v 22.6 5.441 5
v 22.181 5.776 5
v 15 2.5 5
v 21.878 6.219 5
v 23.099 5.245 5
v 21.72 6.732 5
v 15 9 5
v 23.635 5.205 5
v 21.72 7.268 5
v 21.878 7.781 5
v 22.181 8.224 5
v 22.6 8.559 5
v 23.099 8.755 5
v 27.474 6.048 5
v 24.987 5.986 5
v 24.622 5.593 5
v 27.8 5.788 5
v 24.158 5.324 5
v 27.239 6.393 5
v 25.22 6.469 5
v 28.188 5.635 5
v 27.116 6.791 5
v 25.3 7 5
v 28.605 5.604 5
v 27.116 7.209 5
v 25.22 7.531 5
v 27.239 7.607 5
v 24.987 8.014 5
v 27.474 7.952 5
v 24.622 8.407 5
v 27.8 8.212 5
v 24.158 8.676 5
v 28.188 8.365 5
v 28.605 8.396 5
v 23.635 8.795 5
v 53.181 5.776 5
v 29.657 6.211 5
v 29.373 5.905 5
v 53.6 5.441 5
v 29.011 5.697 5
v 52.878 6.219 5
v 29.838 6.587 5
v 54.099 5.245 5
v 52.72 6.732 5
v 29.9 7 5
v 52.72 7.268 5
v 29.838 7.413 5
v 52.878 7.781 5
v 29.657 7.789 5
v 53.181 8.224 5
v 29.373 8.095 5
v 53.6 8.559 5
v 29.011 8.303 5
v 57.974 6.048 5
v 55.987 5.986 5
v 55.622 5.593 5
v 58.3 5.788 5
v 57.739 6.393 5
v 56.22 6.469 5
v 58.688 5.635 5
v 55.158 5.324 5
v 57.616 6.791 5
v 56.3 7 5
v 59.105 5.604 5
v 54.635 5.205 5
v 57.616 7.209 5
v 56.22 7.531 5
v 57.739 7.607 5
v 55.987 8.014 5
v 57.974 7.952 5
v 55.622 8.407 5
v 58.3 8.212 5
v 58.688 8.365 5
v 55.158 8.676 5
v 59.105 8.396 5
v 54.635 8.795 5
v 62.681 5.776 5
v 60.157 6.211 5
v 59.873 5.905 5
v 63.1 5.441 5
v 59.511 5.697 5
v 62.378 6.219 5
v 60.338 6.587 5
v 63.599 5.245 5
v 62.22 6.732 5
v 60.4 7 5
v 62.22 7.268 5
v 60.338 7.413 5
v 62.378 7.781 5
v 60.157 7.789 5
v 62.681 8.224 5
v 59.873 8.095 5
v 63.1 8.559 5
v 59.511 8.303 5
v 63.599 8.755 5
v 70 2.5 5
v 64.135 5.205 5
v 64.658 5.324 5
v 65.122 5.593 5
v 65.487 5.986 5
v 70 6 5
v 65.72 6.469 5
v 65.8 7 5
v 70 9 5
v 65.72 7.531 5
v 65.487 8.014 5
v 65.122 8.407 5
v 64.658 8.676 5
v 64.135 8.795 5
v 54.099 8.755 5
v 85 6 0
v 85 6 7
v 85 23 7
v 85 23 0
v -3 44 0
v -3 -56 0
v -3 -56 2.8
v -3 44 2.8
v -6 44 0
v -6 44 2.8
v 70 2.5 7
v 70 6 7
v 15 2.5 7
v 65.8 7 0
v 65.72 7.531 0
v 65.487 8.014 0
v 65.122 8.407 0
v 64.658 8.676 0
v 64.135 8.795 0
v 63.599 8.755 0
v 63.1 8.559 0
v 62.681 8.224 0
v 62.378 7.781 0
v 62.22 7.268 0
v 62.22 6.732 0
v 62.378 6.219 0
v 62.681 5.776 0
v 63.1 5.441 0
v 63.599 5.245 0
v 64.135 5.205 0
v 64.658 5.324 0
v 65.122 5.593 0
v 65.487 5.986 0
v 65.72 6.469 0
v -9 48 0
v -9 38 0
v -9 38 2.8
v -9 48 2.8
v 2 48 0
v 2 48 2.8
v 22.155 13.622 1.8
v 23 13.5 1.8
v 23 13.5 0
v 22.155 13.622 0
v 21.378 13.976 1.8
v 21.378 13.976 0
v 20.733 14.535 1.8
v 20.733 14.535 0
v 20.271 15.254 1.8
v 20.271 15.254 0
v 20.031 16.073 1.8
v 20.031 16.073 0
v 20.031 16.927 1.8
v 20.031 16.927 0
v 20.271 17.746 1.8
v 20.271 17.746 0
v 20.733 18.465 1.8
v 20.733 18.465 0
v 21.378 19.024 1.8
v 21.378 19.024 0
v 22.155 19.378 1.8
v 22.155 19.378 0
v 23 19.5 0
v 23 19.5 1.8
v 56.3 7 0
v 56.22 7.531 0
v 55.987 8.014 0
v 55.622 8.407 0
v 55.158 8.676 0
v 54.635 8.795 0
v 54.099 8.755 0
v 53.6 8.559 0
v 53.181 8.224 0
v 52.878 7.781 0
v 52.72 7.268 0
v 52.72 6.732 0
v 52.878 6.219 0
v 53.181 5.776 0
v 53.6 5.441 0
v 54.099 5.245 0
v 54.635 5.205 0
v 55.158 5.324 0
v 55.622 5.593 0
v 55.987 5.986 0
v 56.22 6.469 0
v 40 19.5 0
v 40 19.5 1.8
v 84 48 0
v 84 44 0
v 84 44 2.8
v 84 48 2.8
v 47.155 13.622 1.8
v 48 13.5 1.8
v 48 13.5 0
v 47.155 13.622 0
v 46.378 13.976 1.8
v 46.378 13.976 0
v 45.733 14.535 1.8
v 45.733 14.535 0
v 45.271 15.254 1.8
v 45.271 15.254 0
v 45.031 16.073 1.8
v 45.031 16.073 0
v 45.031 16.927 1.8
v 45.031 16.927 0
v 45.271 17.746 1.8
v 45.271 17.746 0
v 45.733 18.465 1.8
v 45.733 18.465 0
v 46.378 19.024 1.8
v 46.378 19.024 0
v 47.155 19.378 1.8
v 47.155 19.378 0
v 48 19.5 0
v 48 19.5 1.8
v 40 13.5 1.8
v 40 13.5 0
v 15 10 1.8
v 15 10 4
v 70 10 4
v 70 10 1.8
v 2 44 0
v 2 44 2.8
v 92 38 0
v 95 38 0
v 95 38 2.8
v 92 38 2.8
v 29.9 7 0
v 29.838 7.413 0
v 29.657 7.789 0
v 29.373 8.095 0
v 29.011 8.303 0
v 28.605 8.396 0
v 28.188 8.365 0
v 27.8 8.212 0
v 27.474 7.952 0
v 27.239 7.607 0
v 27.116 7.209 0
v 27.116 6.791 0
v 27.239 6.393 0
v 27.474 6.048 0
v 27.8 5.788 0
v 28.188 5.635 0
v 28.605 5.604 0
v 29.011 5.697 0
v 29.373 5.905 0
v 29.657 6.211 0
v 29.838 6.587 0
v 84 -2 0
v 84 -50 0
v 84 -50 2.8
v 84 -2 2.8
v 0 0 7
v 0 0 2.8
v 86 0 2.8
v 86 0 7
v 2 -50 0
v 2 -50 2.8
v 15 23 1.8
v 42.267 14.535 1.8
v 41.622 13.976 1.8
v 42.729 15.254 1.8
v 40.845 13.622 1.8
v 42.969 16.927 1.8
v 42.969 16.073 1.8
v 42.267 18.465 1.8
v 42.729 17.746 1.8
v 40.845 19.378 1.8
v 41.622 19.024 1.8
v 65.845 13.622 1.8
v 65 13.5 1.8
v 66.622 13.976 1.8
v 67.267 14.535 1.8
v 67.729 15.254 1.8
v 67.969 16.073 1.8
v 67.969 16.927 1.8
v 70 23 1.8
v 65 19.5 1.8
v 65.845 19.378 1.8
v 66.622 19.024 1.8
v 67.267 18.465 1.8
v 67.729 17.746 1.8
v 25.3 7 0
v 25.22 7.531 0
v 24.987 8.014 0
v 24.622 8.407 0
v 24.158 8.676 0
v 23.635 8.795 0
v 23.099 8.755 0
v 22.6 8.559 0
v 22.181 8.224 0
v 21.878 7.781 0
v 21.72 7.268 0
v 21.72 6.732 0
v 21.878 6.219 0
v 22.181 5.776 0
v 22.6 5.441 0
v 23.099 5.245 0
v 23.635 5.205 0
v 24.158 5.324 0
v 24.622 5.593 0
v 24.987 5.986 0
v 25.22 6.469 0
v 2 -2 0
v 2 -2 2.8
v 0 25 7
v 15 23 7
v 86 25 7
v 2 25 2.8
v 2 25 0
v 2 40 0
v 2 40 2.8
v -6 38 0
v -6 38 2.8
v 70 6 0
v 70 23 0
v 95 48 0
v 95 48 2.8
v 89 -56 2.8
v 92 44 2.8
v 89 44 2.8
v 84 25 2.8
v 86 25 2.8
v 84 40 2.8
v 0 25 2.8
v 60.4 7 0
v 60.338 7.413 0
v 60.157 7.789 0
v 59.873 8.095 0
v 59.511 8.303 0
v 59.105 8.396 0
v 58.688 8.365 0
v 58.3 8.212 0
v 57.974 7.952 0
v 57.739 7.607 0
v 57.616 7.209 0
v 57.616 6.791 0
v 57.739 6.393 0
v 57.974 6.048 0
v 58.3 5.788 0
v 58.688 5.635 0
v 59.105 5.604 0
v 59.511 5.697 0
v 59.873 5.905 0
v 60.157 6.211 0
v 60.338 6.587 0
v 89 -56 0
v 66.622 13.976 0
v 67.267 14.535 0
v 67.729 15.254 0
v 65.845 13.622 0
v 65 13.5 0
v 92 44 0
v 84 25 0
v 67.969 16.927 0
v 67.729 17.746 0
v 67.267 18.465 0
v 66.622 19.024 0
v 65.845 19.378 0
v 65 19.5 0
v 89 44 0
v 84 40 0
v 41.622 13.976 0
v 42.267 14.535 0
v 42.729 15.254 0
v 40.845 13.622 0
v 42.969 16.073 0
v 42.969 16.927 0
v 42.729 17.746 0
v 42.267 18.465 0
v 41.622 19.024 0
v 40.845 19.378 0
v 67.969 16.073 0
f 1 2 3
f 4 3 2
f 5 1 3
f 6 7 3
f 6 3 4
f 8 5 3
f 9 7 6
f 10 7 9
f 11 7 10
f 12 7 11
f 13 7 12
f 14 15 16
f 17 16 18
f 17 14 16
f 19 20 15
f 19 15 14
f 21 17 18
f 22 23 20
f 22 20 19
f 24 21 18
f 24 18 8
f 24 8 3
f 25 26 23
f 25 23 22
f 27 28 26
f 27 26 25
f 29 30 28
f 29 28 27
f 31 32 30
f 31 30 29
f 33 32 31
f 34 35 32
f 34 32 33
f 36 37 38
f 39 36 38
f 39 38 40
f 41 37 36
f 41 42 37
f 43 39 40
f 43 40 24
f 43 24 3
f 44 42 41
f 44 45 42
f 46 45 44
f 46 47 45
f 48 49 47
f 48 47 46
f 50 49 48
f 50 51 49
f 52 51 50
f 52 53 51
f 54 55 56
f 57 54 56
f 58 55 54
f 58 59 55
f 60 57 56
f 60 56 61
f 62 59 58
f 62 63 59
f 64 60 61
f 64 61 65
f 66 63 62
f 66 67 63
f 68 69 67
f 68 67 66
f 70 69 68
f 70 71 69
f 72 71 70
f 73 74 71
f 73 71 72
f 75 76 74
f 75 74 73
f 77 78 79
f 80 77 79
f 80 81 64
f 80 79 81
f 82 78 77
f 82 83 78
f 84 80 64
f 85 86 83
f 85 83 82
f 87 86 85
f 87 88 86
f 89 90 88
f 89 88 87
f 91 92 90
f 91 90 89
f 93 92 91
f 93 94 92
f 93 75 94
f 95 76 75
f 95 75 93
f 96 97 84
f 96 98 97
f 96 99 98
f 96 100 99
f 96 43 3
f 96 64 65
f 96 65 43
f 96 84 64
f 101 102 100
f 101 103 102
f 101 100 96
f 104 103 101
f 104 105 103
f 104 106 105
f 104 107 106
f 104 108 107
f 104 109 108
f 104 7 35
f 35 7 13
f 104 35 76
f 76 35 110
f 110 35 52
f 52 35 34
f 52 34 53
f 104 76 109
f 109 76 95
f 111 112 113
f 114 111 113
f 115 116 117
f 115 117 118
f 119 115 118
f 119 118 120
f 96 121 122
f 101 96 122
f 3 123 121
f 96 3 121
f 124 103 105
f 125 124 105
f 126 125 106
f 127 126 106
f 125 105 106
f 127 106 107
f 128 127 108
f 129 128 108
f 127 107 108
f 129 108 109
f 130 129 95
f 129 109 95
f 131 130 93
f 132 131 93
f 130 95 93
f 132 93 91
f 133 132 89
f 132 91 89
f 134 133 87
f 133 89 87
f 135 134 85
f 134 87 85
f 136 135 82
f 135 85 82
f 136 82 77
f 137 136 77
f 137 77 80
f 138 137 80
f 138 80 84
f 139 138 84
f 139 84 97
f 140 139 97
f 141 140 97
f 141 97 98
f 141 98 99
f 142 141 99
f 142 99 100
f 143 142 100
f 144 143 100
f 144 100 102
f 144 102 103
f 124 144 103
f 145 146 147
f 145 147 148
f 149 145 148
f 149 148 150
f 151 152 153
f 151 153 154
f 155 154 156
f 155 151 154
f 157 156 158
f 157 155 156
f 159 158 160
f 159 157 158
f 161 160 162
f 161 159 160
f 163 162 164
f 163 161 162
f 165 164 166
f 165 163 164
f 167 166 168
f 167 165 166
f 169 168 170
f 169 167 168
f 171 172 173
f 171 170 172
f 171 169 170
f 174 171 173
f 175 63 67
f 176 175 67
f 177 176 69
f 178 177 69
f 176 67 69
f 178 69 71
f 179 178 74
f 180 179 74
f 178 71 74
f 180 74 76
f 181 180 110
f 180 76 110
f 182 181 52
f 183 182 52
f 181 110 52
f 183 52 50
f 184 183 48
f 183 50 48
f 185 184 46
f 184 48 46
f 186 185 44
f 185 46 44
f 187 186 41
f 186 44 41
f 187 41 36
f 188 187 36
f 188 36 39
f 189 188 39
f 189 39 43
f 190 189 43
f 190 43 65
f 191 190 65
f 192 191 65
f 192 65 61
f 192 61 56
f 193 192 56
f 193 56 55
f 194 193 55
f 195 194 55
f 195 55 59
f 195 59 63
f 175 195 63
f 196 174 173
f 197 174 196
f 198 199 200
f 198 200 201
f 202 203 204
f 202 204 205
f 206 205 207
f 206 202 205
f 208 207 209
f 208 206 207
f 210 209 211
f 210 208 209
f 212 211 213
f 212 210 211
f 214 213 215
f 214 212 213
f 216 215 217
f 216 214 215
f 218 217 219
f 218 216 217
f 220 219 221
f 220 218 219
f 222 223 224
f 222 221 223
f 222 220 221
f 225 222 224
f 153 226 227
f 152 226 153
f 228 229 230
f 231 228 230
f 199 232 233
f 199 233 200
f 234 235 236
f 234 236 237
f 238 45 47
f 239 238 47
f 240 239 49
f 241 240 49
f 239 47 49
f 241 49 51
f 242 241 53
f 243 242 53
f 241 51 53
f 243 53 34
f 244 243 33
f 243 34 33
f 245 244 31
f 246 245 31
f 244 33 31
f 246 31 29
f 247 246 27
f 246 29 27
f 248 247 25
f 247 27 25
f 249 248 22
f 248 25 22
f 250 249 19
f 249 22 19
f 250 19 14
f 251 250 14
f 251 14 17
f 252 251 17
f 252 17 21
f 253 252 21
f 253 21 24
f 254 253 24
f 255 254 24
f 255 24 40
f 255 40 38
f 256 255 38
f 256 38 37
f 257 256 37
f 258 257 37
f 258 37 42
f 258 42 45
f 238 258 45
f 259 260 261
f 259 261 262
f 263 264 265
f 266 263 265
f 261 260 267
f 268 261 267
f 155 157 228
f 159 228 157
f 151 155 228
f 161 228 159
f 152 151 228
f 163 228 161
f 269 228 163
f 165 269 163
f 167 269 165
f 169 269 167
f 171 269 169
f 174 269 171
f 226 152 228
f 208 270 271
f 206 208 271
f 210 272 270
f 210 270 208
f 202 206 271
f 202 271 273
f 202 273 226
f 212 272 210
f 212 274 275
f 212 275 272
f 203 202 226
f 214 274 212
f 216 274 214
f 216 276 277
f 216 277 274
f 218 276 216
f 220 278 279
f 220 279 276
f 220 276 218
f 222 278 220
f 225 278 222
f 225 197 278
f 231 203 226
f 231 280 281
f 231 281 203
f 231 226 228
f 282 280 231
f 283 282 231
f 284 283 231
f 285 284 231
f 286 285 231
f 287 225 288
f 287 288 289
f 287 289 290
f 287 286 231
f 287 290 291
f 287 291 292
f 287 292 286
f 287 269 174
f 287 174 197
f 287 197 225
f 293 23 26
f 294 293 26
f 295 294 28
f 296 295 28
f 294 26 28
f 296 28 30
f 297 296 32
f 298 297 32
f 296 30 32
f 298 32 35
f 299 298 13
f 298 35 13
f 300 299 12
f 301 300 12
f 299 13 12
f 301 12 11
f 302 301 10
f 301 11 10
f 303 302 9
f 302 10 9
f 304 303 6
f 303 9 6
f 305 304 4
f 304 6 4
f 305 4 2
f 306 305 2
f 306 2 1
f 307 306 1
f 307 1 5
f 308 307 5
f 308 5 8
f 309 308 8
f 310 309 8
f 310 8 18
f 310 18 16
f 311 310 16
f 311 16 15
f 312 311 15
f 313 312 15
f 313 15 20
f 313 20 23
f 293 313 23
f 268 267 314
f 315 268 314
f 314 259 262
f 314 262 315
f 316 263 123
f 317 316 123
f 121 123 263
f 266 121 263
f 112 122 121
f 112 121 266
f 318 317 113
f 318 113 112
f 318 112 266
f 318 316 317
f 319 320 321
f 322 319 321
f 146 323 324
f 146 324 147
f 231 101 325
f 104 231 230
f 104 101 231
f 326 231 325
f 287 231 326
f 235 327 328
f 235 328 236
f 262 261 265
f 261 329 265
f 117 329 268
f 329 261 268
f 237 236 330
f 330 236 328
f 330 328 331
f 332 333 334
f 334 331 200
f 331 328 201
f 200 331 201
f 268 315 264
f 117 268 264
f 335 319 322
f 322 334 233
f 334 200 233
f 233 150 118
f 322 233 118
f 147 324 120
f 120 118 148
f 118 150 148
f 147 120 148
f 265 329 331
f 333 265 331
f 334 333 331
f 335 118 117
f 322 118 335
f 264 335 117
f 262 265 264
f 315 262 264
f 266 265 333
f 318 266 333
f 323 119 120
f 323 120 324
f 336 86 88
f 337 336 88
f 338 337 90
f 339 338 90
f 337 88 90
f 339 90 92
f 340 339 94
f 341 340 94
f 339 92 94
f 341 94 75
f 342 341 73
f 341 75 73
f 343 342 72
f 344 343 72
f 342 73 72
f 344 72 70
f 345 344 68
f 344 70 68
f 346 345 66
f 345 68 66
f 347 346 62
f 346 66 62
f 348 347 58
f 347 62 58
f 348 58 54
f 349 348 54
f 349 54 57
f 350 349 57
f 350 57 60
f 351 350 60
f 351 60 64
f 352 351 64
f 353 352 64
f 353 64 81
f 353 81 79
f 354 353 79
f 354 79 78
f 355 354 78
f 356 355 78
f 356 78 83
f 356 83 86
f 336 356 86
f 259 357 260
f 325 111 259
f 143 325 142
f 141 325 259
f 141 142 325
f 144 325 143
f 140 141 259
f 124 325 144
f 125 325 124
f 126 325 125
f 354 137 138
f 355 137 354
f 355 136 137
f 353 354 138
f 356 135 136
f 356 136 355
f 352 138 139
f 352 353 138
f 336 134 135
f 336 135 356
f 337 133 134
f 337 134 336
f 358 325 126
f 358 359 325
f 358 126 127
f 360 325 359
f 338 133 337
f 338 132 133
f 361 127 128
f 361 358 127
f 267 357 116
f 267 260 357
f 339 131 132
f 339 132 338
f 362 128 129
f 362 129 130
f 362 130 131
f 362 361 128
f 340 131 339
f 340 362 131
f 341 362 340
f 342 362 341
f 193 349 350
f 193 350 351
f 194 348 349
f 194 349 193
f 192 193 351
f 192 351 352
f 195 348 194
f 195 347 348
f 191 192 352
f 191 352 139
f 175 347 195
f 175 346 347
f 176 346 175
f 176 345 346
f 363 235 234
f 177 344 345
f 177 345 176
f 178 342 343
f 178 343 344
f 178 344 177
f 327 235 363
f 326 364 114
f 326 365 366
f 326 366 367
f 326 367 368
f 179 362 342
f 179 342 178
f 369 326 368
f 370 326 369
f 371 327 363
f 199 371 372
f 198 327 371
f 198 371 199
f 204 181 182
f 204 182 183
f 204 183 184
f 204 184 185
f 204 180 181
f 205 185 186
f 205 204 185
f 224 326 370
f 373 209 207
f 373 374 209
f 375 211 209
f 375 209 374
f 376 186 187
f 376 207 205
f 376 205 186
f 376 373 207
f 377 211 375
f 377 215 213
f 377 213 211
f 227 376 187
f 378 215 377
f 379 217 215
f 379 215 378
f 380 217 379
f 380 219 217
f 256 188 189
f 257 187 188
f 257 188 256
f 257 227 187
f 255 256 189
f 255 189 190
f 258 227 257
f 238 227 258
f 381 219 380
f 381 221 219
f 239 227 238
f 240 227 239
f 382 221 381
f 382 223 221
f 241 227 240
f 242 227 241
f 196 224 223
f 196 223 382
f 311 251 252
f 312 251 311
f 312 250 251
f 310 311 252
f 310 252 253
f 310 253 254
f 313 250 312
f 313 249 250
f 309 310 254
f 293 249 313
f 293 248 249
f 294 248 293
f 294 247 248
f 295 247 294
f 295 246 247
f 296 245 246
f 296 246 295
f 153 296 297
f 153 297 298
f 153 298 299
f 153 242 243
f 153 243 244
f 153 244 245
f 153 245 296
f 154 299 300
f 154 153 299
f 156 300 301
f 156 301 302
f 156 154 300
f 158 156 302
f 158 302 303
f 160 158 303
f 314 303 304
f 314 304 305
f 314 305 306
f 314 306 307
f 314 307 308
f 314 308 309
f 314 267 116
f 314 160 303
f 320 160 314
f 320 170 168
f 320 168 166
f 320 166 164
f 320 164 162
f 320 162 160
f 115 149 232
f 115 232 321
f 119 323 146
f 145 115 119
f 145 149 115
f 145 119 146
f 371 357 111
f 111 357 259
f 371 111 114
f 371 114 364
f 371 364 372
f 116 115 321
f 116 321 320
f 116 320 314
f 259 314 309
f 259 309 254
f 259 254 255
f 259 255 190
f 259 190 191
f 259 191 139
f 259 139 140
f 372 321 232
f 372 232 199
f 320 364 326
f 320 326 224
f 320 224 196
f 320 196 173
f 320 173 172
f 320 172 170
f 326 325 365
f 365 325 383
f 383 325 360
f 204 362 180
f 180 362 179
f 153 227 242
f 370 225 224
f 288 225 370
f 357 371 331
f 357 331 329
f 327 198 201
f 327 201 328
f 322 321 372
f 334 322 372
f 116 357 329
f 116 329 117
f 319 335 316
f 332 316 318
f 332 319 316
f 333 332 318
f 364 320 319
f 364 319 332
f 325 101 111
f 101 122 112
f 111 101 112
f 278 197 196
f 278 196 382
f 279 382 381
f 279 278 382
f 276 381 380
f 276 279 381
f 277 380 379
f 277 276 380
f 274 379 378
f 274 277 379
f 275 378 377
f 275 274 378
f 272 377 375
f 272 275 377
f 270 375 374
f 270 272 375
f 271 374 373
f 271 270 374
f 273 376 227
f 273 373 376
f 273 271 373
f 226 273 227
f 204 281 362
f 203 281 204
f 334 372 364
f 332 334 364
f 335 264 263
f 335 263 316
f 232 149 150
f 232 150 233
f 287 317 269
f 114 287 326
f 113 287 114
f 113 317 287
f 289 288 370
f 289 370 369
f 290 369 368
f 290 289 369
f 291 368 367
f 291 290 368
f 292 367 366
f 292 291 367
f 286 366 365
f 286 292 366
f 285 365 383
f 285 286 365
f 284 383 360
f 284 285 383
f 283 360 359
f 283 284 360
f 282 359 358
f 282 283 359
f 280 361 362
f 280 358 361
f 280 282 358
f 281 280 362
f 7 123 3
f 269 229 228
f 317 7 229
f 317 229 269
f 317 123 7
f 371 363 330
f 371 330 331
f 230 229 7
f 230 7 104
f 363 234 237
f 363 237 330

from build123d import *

# Parameters (mm, degrees)
SKETCH_1_W          = 86
SKETCH_1_H          = 25
EXTRUDE_1_DEPTH     = 7
SKETCH_2_W          = 15
SKETCH_2_H          = 17
CUT_EXTRUDE_1_DEPTH = 90.833178726
SKETCH_3_W          = 55
SKETCH_3_H          = 13
CUT_EXTRUDE_2_DEPTH = 5.2
SKETCH_4_W          = 55
SKETCH_4_H          = 7.5
CUT_EXTRUDE_3_DEPTH = 2
SKETCH_5_R          = 1.8
CUT_EXTRUDE_4_DEPTH = 90.699498326
SKETCH_6_R          = 1.4
CUT_EXTRUDE_5_DEPTH = 90.699498326
CUT_EXTRUDE_6_DEPTH = 90.710868907
CHAMFER_1_SIZE      = 1
SKETCH_8_W          = 82
SKETCH_8_H          = 48
EXTRUDE_2_DEPTH     = 2.8


with BuildPart() as part:
    # 草图1 → 凸台-拉伸1 (new body)
    with BuildSketch(Plane.XY):
        with Locations((43, 12.5)):
            Rectangle(SKETCH_1_W, SKETCH_1_H)
    extrude(amount=EXTRUDE_1_DEPTH)

    # 草图2 → 切除-拉伸1 (cut, through all)
    with BuildSketch(Plane.XY.offset(7)):
        with Locations((77.5, 14.5)):
            Rectangle(SKETCH_2_W, SKETCH_2_H)
    extrude(amount=-CUT_EXTRUDE_1_DEPTH, mode=Mode.SUBTRACT)

    # 草图3 → 切除-拉伸2 (cut)
    with BuildSketch(Plane.XY.offset(7)):
        with Locations((42.5, 16.5)):
            Rectangle(SKETCH_3_W, SKETCH_3_H)
    extrude(amount=-CUT_EXTRUDE_2_DEPTH, mode=Mode.SUBTRACT)

    # 草图4 → 切除-拉伸3 (cut)
    with BuildSketch(Plane.XY.offset(7)):
        with Locations((42.5, 6.25)):
            Rectangle(SKETCH_4_W, SKETCH_4_H)
    extrude(amount=-CUT_EXTRUDE_3_DEPTH, mode=Mode.SUBTRACT)

    # 草图5 → 切除-拉伸4 (cut, through all)
    with BuildSketch(Plane.XY.offset(5)):
        with Locations((64, 7)):
            Circle(SKETCH_5_R)
        with Locations((54.5, 7)):
            Circle(SKETCH_5_R)
        with Locations((23.5, 7)):
            Circle(SKETCH_5_R)
    extrude(amount=-CUT_EXTRUDE_4_DEPTH, mode=Mode.SUBTRACT)

    # 草图6 → 切除-拉伸5 (cut, through all)
    with BuildSketch(Plane.XY.offset(5)):
        with Locations((59, 7)):
            Circle(SKETCH_6_R)
        with Locations((28.5, 7)):
            Circle(SKETCH_6_R)
    extrude(amount=-CUT_EXTRUDE_5_DEPTH, mode=Mode.SUBTRACT)

    # 草图7 → 切除-拉伸6 (cut, through all)
    with BuildSketch(Plane.XY.offset(1.8)):
        with BuildLine():
            Line((23, 19.5), (40, 19.5))
            ThreePointArc((40, 19.5), (43, 16.5), (40, 13.5))
            Line((40, 13.5), (23, 13.5))
            ThreePointArc((23, 13.5), (20, 16.5), (23, 19.5))
        make_face()
        with BuildLine():
            Line((48, 19.5), (65, 19.5))
            ThreePointArc((65, 19.5), (68, 16.5), (65, 13.5))
            Line((65, 13.5), (48, 13.5))
            ThreePointArc((48, 13.5), (45, 16.5), (48, 19.5))
        make_face()
    extrude(amount=-CUT_EXTRUDE_6_DEPTH, mode=Mode.SUBTRACT)

    # 倒角1
    chamfer_1_edges = [part.edges().sort_by_distance(p)[0] for p in [
        (42.5, 10, 5),
    ]]
    chamfer(chamfer_1_edges, length=CHAMFER_1_SIZE)

    # 草图8 → 凸台-拉伸2 (add)
    with BuildSketch(Plane(origin=(0, 0, 0), x_dir=(-1, 0, 0), z_dir=(0, 0, -1))):
        Polygon((-95, 38), (-92, 38), (-92, 44), (-89, 44), (-89, -56), (3, -56), (3, 44), (6, 44), (6, 38), (9, 38), (9, 48), (-2, 48), (-2, 44), (-84, 44), (-84, 48), (-95, 48), align=None)
        Polygon((-86, 0), (0, 0), (0, 25), (-2, 25), (-2, 40), (-84, 40), (-84, 25), (-86, 25), align=None, mode=Mode.SUBTRACT)
        with Locations((-43, -26)):
            Rectangle(SKETCH_8_W, SKETCH_8_H, mode=Mode.SUBTRACT)
    extrude(amount=-EXTRUDE_2_DEPTH)


solid = part.part
